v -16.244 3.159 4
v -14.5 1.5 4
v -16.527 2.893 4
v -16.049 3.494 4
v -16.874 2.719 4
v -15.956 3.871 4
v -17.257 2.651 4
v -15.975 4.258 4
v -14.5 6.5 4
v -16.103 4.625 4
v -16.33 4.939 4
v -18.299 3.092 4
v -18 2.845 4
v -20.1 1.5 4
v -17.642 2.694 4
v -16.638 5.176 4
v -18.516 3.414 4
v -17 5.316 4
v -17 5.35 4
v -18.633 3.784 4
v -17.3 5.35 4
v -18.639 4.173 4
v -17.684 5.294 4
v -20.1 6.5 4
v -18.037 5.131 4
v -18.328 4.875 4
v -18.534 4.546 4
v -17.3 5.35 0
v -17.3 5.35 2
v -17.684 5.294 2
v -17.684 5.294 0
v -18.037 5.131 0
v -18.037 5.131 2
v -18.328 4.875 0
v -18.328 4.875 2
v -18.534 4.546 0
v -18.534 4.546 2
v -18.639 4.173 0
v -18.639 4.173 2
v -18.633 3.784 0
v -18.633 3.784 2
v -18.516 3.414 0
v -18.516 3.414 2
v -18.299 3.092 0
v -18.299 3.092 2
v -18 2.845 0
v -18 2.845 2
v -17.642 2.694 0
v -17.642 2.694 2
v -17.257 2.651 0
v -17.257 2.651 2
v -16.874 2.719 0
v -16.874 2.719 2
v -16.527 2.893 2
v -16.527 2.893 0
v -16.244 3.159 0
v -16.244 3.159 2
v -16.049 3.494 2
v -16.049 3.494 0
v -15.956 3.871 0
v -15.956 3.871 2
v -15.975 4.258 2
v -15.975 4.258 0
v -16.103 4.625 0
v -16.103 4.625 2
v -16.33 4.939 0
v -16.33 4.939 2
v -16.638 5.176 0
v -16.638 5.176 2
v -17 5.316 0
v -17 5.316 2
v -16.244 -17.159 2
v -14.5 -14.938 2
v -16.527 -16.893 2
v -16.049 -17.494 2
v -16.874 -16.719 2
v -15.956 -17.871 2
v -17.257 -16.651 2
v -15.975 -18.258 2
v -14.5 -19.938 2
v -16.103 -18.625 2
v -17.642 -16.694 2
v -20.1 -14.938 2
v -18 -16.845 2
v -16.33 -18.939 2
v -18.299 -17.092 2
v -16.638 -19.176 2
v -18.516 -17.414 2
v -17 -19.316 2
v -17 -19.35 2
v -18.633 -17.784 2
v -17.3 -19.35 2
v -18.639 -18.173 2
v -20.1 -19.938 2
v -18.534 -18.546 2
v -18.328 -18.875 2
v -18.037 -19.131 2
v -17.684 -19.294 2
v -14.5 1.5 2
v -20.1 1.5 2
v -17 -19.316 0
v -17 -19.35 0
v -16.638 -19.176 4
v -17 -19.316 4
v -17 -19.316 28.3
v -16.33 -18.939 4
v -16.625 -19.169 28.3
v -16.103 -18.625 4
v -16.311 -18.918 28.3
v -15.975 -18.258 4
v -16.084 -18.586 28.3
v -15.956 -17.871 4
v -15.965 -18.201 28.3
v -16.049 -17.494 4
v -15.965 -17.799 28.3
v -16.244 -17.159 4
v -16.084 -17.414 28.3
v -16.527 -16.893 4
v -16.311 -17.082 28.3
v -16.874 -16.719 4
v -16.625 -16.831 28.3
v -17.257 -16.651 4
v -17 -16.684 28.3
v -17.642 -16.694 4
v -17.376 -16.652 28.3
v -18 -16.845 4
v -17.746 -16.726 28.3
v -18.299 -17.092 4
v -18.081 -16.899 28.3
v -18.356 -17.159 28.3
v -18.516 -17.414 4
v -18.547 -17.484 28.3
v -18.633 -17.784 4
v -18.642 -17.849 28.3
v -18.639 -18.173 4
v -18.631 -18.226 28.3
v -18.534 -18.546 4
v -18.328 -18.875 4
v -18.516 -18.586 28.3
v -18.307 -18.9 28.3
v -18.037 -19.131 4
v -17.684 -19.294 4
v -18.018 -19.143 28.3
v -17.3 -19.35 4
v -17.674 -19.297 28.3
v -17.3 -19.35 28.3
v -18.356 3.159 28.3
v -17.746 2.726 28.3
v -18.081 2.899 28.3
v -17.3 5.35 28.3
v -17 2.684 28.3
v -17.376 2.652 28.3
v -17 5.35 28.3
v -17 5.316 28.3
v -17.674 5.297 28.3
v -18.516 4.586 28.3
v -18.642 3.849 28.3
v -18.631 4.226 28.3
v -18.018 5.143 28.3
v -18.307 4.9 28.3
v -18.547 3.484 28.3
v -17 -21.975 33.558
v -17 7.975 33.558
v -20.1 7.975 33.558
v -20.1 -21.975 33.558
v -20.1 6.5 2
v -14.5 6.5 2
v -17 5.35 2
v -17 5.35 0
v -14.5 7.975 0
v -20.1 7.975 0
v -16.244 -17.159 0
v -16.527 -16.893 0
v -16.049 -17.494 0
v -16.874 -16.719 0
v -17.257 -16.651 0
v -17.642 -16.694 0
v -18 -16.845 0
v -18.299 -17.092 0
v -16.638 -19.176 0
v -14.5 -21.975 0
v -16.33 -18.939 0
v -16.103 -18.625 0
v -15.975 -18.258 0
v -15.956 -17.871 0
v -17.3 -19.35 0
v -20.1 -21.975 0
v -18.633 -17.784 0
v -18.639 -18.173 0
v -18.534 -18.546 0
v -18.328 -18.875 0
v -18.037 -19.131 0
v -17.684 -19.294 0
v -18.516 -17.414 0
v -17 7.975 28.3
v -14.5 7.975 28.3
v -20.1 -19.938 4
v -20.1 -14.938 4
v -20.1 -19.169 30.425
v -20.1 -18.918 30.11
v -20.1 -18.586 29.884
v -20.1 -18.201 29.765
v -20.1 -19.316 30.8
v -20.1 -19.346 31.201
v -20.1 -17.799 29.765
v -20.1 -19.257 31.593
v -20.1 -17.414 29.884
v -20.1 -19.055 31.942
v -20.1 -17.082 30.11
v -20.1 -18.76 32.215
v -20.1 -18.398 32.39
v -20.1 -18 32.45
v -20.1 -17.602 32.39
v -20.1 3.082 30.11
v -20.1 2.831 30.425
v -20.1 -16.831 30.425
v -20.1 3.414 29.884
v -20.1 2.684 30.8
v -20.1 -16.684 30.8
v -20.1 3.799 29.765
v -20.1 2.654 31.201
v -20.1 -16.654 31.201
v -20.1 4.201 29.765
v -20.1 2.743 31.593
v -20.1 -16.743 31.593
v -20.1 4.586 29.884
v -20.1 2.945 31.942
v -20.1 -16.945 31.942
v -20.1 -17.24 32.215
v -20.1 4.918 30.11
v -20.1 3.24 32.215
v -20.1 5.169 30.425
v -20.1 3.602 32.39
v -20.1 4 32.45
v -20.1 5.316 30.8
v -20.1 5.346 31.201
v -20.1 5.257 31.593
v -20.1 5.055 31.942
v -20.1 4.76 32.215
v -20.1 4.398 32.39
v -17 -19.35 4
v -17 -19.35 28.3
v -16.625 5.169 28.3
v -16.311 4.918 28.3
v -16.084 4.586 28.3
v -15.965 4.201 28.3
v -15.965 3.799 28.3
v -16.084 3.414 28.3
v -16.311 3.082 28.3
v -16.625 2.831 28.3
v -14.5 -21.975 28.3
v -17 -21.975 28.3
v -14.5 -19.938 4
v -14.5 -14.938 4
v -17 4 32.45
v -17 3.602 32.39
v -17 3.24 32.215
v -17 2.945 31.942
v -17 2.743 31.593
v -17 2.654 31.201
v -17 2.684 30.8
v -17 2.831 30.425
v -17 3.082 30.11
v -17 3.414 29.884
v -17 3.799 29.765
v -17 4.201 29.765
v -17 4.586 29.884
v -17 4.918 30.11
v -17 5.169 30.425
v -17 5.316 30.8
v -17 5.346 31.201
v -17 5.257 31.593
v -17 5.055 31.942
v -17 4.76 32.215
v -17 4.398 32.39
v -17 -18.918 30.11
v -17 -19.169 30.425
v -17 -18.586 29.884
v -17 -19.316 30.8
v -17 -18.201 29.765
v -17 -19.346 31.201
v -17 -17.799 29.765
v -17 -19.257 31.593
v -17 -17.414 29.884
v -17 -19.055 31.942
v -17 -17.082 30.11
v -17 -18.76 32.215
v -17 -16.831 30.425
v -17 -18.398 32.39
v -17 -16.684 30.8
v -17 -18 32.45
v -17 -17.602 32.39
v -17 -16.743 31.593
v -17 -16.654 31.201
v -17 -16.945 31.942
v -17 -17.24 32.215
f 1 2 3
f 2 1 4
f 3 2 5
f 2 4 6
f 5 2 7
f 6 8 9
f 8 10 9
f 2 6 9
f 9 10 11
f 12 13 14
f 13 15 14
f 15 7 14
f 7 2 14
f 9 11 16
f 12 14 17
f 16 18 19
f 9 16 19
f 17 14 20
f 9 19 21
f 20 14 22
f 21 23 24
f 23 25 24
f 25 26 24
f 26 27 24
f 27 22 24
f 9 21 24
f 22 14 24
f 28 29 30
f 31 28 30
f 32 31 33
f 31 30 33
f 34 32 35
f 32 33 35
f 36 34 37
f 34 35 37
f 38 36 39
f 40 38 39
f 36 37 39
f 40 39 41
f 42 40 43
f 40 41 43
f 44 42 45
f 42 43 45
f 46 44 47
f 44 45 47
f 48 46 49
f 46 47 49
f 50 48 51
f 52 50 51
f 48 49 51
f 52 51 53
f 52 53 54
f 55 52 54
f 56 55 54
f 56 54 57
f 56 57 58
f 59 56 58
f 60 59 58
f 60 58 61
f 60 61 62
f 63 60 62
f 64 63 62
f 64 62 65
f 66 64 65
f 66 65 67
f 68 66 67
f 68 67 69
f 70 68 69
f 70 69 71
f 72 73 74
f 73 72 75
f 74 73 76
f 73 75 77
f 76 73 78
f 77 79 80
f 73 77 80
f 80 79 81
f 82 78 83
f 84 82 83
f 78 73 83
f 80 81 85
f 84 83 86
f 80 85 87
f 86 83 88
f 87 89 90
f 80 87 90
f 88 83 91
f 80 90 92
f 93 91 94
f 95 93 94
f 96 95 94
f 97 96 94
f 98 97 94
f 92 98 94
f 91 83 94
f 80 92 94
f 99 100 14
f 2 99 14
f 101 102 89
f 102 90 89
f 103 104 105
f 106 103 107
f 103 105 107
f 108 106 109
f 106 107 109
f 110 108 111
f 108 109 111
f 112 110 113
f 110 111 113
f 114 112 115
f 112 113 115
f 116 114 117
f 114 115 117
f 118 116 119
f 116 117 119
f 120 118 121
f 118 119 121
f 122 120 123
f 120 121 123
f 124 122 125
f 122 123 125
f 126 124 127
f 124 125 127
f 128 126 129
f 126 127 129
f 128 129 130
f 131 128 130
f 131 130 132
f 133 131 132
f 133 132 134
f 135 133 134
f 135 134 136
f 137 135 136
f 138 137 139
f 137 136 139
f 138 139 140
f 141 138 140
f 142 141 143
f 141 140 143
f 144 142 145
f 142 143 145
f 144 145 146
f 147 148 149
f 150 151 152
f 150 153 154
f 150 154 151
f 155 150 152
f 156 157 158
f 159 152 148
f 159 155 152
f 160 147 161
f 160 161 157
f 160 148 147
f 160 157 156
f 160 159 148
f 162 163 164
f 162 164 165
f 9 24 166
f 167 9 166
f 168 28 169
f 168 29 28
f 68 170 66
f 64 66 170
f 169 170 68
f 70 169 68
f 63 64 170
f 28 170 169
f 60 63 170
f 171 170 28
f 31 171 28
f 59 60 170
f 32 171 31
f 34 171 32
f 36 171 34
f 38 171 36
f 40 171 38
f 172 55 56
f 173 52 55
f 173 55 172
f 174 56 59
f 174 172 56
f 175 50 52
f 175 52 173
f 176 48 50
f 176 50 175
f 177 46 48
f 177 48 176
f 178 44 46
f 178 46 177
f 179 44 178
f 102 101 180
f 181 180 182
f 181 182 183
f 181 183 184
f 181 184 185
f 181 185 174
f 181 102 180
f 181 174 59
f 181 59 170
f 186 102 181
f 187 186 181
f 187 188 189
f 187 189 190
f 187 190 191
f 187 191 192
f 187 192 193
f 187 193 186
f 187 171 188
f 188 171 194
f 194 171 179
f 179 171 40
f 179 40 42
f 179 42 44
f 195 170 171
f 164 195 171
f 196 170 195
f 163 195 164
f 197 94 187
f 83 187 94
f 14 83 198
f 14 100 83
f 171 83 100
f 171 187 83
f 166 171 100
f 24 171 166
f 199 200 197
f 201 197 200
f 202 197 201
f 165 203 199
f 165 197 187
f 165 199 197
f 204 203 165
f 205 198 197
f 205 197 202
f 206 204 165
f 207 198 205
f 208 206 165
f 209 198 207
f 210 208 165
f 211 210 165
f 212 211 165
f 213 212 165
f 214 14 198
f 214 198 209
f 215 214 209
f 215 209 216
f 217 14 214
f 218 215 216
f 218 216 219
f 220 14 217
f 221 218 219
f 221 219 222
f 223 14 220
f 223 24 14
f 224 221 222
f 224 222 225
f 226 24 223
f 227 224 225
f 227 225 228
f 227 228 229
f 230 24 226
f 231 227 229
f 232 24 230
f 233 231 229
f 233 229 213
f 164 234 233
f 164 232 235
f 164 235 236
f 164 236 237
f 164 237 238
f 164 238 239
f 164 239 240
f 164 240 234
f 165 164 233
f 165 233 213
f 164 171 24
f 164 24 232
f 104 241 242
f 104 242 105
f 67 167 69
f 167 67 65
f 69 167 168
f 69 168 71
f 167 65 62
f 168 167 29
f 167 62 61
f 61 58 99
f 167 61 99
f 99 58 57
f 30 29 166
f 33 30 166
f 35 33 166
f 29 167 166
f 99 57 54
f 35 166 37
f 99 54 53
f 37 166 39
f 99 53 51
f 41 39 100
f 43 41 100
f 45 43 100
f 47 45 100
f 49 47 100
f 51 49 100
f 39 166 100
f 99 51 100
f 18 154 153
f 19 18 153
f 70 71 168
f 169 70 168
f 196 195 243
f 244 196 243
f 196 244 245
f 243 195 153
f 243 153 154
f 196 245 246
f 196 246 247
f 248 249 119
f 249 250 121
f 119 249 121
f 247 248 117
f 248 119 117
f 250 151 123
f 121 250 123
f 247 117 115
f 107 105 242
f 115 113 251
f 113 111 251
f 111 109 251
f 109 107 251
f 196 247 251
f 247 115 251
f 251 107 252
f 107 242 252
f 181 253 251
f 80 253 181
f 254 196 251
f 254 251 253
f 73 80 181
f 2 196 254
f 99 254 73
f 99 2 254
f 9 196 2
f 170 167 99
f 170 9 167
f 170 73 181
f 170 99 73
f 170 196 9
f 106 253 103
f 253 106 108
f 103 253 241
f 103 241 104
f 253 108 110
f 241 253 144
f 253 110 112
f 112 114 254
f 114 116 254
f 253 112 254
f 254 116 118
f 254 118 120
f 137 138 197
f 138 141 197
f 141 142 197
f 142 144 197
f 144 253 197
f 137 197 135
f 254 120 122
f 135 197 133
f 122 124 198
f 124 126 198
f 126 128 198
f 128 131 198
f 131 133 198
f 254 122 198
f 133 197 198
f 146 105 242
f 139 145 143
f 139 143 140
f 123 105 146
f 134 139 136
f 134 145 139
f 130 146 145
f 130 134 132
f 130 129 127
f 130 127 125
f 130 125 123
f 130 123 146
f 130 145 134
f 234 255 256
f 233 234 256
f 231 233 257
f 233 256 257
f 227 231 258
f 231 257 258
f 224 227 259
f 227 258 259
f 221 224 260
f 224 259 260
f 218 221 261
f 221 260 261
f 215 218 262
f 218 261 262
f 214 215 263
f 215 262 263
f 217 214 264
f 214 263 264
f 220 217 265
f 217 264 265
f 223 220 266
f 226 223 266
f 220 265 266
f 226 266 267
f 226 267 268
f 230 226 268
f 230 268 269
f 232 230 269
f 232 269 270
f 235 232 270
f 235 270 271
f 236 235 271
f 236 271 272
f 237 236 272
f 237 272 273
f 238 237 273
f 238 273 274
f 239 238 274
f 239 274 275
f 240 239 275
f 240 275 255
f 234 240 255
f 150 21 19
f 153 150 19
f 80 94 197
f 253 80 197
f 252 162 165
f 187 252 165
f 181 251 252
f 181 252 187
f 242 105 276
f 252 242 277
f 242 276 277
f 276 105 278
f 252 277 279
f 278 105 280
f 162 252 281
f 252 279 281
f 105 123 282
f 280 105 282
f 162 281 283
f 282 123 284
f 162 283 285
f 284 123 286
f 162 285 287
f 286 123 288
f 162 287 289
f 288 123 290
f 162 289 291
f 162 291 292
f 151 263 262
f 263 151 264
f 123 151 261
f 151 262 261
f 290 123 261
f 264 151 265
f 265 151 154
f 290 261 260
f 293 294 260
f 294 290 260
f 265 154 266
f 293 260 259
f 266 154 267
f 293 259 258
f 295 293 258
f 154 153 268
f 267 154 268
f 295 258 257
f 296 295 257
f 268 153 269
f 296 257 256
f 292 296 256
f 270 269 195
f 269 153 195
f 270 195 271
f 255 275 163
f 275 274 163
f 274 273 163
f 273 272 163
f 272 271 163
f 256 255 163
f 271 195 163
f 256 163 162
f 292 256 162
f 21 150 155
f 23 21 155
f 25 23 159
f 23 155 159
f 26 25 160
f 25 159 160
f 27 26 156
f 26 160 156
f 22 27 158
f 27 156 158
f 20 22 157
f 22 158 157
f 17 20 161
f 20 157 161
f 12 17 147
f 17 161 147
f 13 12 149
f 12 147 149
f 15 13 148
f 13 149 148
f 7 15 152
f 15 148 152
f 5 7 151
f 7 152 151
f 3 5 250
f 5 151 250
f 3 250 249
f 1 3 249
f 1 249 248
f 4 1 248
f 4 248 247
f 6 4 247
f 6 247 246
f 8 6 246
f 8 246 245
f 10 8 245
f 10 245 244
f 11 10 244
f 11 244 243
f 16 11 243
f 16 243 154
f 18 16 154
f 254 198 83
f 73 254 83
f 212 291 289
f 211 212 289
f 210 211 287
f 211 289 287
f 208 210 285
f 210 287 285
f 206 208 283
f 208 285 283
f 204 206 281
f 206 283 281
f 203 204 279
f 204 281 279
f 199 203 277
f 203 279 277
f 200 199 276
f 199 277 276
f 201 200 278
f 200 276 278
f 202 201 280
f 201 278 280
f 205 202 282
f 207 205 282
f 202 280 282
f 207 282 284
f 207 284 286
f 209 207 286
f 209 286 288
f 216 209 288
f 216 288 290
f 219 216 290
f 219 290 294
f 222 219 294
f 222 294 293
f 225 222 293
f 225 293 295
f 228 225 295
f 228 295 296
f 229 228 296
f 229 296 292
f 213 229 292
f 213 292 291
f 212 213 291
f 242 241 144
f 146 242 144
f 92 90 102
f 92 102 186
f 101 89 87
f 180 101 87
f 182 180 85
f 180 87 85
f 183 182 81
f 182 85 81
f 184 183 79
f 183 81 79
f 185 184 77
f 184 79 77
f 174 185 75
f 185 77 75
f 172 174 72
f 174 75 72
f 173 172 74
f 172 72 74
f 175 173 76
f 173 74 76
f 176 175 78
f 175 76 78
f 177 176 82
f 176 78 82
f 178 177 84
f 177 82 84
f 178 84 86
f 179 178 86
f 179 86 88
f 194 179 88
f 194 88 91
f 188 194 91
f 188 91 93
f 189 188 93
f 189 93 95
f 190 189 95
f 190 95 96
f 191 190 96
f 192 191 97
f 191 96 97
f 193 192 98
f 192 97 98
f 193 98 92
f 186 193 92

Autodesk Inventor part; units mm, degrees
ref_plane "YZ Plane" through (0, 0, 0) normal (1, 0, 0) x (0, 1, 0)
ref_plane "XZ Plane" through (0, 0, 0) normal (0, 1, 0) x (-1, 0, 0)
ref_plane "XY Plane" through (0, 0, 0) normal (0, 0, 1) x (1, 0, 0)
ref_plane "작업 평면1" through (0, 0, 0) normal (0, 0, 1) x (1, 0, 0)
ref_plane "작업 평면2" through (-17, 0, 48.4) normal (-1, 0, 0) x (0, 0, 1)
sketch "스케치2" plane through (-17, 0, 48.4) normal (-1, 0, 0) x (0, 0, 1)
  line L0 (13.5, -39.75) -> (11.5, -39.75) projected
  arc A0 (11.5, -39.75) -> (9.25, -42) centre (11.5, -42) ccw projected
  line L1 (9.25, -42) -> (9.25, -44) projected
  arc A1 (8.25, -45) -> (9.25, -44) centre (8.25, -44) ccw projected
  line L2 (8.25, -45) -> (-8.25, -45) projected
  arc A2 (-9.25, -44) -> (-8.25, -45) centre (-8.25, -44) ccw projected
  line L3 (-9.25, -44) -> (-9.25, -42) projected
  arc A3 (-9.25, -42) -> (-11.5, -39.75) centre (-11.5, -42) ccw projected
  line L4 (-11.5, -39.75) -> (-13.5, -39.75) projected
  arc A4 (-14.5, -38.75) -> (-13.5, -39.75) centre (-13.5, -38.75) ccw projected
  line L5 (-14.5, -38.75) -> (-14.5, 8.25) projected
  arc A5 (-13.5, 9.25) -> (-14.5, 8.25) centre (-13.5, 8.25) ccw projected
  line L6 (-13.5, 9.25) -> (-11.5, 9.25) projected
  arc A6 (-11.5, 9.25) -> (-9.25, 11.5) centre (-11.5, 11.5) ccw projected
  line L7 (-9.25, 11.5) -> (-9.25, 14.5) projected
  line L8 (-15, 14.5) -> (-9.25, 14.5) projected
  line L9 (-20.1, 8.5) -> (-15, 14.5) projected
  line L10 (-20.1, -44.6) -> (-20.1, 8.5) projected
  line L11 (-15, -50.6) -> (-20.1, -44.6) projected
  line L12 (15, -50.6) -> (-15, -50.6) projected
  line L13 (20.1, -44.6) -> (15, -50.6) projected
  line L14 (20.1, 8.5) -> (20.1, -44.6) projected
  line L15 (15, 14.5) -> (20.1, 8.5) projected
  line L16 (9.25, 14.5) -> (15, 14.5) projected
  line L17 (9.25, 14.5) -> (9.25, 11.5) projected
  arc A7 (9.25, 11.5) -> (11.5, 9.25) centre (11.5, 11.5) ccw projected
  line L18 (11.5, 9.25) -> (13.5, 9.25) projected
  arc A8 (14.5, 8.25) -> (13.5, 9.25) centre (13.5, 8.25) ccw projected
  line L19 (14.5, 8.25) -> (14.5, -38.75) projected
  arc A9 (13.5, -39.75) -> (14.5, -38.75) centre (13.5, -38.75) ccw projected
  circle A10 centre (17.3, 4) radius 1.35 projected
  circle A11 centre (17.3, -18) radius 1.35 projected
  circle A12 centre (11, -47.8) radius 1.35 projected
  circle A13 centre (-17.3, 4) radius 1.35 projected
  circle A14 centre (-17.3, -18) radius 1.35 projected
  circle A15 centre (-11, -47.8) radius 1.35 projected
  circle A16 centre (17.3, -40) radius 1.35 projected
  circle A17 centre (-17.3, -40) radius 1.35 projected
  circle A18 centre (-17.3, -18) radius 2.8
  circle A19 centre (-17.3, 4) radius 2.8
  line L20 (-17.3, -18) -> (-17.3, 4)
  line L21 (-17.3, 4) -> (-17.3, -7)
  line L22 (-19.7531, 5.35) -> (-19.7531, -19.35)
  line L23 (-19.7531, -19.35) -> (-14.8469, -19.35)
  line L24 (-14.8469, -19.35) -> (-14.8469, 5.35)
  line L25 (-14.8469, 5.35) -> (-19.7531, 5.35)
  line L26 (-19.7531, 5.35) -> (-14.8469, -19.35) construction
  line L27 (-19.7531, -19.35) -> (-14.8469, 5.35) construction
  point P0 (-48.4, 0)
  point P1 (-19.7531, -19.35)
  point P2 (-14.8469, -19.35)
  point P3 (-14.8469, 5.35)
  point P4 (-19.7531, 5.35)
  dimension "d0" = 11
extrude "돌출1" add sketch "스케치2" along normal blind 3.1 contours A18 L23 | L23 A14 L20 A18 L24 | A18 L20 A19 L24 | L25 A19 | L24 A19 L20 A13 L25 | L22 A18 L20 A14 L23 | A18 L22 A19 L20 | L25 A13 L20 A19 L22
sketch "스케치3" plane through (-17, -19.35, 28.6469) normal (0, 0, -1) x (-1, 0, 0)
  line L0 (3.1, 24.7) -> (3.1, 0) projected
  line L1 (0, 0) -> (3.1, 0) projected
  line L2 (0, 24.7) -> (0, 0) projected
  line L3 (0, 0) -> (3.1, 0) projected
  line L4 (3.1, 24.7) -> (3.1, 0) projected
  line L5 (0, 24.7) -> (3.1, 24.7) projected
  point P0 (-17, 19.35)
extrude "돌출2" add sketch "스케치3" along normal blind 0.347
sketch "스케치4" plane through (-17, -19.35, 28.2999) normal (0, 0, -1) x (-1, 0, 0)
  line L0 (-4.5, 27.325) -> (-4.5, 25.825) projected
  line L1 (-4.5, 25.825) -> (-2.5, 25.825) projected
  line L2 (-2.5, 20.875) -> (-2.5, 25.825) projected
  line L3 (-4.5, 20.875) -> (-2.5, 20.875) projected
  line L4 (-4.5, 20.875) -> (-4.5, 19.375) projected
  line L5 (-4.5, 19.375) -> (-2, 19.375) projected
  line L6 (-2, 5.325) -> (-2, 19.375) projected
  line L7 (-2, 5.325) -> (-4.5, 5.325) projected
  line L8 (-4.5, 5.325) -> (-4.5, 3.825) projected
  line L9 (-4.5, 3.825) -> (-2.5, 3.825) projected
  line L10 (-2.5, -1.125) -> (-2.5, 3.825) projected
  line L11 (-4.5, -1.125) -> (-2.5, -1.125) projected
  line L12 (-4.5, -1.125) -> (-4.5, -2.625) projected
  line L13 (-4.5, -2.625) -> (-2, -2.625) projected
  line L14 (-2, -16.675) -> (-2, -2.625) projected
  line L15 (-2, -16.675) -> (-4.5, -16.675) projected
  line L16 (-4.5, -16.675) -> (-4.5, -18.175) projected
  line L17 (-4.5, -18.175) -> (-2.5, -18.175) projected
  line L18 (-2.5, -23.125) -> (-2.5, -18.175) projected
  line L19 (-4.5, -23.125) -> (-2.5, -23.125) projected
  line L20 (-4.5, -23.125) -> (-4.5, -24.625) projected
  line L21 (-4.5, -24.625) -> (-2, -24.625) projected
  line L22 (-2, -25.25) -> (-2, -24.625) projected
  line L23 (-2, -25.25) -> (0, -25.25) projected
  line L24 (0, -25.25) -> (0, 27.85) projected
  line L25 (-2, 27.85) -> (0, 27.85) projected
  line L26 (-2, 27.325) -> (-2, 27.85) projected
  line L27 (-2, 27.325) -> (-4.5, 27.325) projected
  line L28 (0, 0) -> (3.1, 0) projected
  line L29 (-2.5, 0) -> (0, 0)
  line L30 (3.1, 24.7) -> (0, 24.7) projected
  line L31 (-2.5, 24.7) -> (0, 24.7)
  line L32 (3.1, -2.625) -> (-2.5, -2.625) projected
  line L33 (-2.5, 27.325) -> (1.417, 27.325) projected
  line L34 (3.1, 24.7) -> (-2.5, 24.7)
  line L35 (-2.5, 24.7) -> (-2.5, 27.325)
  line L36 (-2.5, 27.325) -> (3.1, 27.325)
  line L37 (3.1, 27.325) -> (3.1, 24.7)
  line L38 (-2.5, 0) -> (3.1, 0)
  line L39 (3.1, 0) -> (3.1, -2.625)
  line L40 (3.1, -2.625) -> (-2.5, -2.625)
  line L41 (-2.5, -2.625) -> (-2.5, 0)
  line L42 (3.1, 23.9266) -> (3.1, -20.3266) projected
  line L43 (3.1, 0) -> (3.1, 24.7) projected
  circle A0 centre (0.3, 1.35) radius 1.35 projected
  circle A1 centre (0.3, 23.35) radius 1.35 projected
  point P0 (-17, 19.35)
  point P1 (1.417, 27.325)
  point P2 (-2.5, 25.825)
  point P3 (-2.5, -1.125)
  point P4 (-2.5, -2.625)
  point P5 (0.3, 24.7)
  point P6 (0, 24.6662)
  point P7 (0, 0.0338)
  point P8 (0.3, 0)
extrude "돌출3" add sketch "스케치4" along normal blind 28.3 contours L27 L33 L24 L31 L2 L35 | L31 L24 A1 A0 L29 L10 L9 L8 L7 L6 L5 L4 L3 L2 | L33 L36 L37 L30 L24 | L30 L43 L42 L28 A0 L24 A1 | L39 L32 L24 L28 | L24 L32 L13 L41 L10 L29
sketch "스케치6" plane through (-17, -19.35, -0.0001) normal (0, 0, -1) x (-1, 0, 0)
  point P0 (-17, 19.35)
sketch "스케치7" plane through (-20.1, 0, 48.4) normal (-1, 0, 0) x (0, 0, 1)
  line L0 (-20.1001, -15.525) -> (-48.4001, -15.525) projected
  line L1 (-20.1001, -19.35) -> (-48.4001, -19.35) projected
  line L2 (-48.4001, 2.65) -> (-20.1001, 2.65) projected
  line L3 (-20.1001, 5.35) -> (-48.4001, 5.35) projected
  line L4 (-48.4001, -19.35) -> (-45.4001, -19.35)
  line L5 (-45.4001, -19.35) -> (-45.4001, 5.35)
  line L6 (-43.3972, -19.35) -> (-43.3972, -17.4375)
  line L7 (-43.3972, -17.4375) -> (-45.4001, -17.4375)
  line L8 (-46.4001, -14.9375) -> (-46.4001, -19.9375)
  line L9 (-46.4001, -19.9375) -> (-44.4001, -19.9375)
  line L10 (-44.4001, -19.9375) -> (-44.4001, -14.9375)
  line L11 (-44.4001, -14.9375) -> (-46.4001, -14.9375)
  line L12 (-46.4001, -14.9375) -> (-44.4001, -19.9375) construction
  line L13 (-46.4001, -19.9375) -> (-44.4001, -14.9375) construction
  line L14 (-45.4001, 2.65) -> (-45.4001, 4)
  line L15 (-46.4001, 6.5) -> (-46.4001, 1.5)
  line L16 (-46.4001, 1.5) -> (-44.4001, 1.5)
  line L17 (-44.4001, 1.5) -> (-44.4001, 6.5)
  line L18 (-44.4001, 6.5) -> (-46.4001, 6.5)
  line L19 (-46.4001, 6.5) -> (-44.4001, 1.5) construction
  line L20 (-46.4001, 1.5) -> (-44.4001, 6.5) construction
  point P0 (-48.4, 0)
  dimension "d7" = 3
  dimension "d8" = 1.9125
  dimension "d9" = 2
  dimension "d10" = 1.35
  dimension "d11" = 5
  dimension "d12" = 5
  dimension "d13" = 2
extrude "돌출4" cut sketch "스케치7" against normal blind 6 contours L10 L7 L5 L0 | L16 L15 L2 L5 | L5 L2 L17 L16 | L0 L5 L11 L10 | L5 L1 L8 L0 | L0 L8 L11 L5 | L10 L1 L5 L7 | L10 L9 L8 L1 | L5 L3 L17 L2 | L2 L15 L3 L5 | L15 L18 L17 L3
sketch "스케치8" plane through (-17, 0, 48.4) normal (-1, 0, 0) x (0, 0, 1)
  line L0 (-20.1001, -21.975) -> (-20.1001, -19.35) projected
  line L1 (-20.1001, -21.975) -> (-20.1001, 7.975)
  line L2 (-20.1001, 7.975) -> (-14.8422, 7.975)
  line L3 (-14.8422, 7.975) -> (-14.8422, -21.975)
  line L4 (-14.8422, -21.975) -> (-20.1001, -21.975)
  arc A0 (-19.7531, -19.35) -> (-14.8469, -19.35) centre (-17.3, -18) ccw projected
  line L5 (-19.7531, -19.35) -> (-20.1001, -19.35) projected
  line L6 (-20.1001, -19.3162) -> (-20.1001, -19.35) projected
  line L7 (-20.1001, -16.6838) -> (-20.1001, -19.3162) projected
  line L8 (-20.1001, 2.6838) -> (-20.1001, -16.6838) projected
  line L9 (-20.1001, 5.3162) -> (-20.1001, 2.6838) projected
  line L10 (-20.1001, 5.35) -> (-20.1001, 5.3162) projected
  line L11 (-19.7531, 5.35) -> (-20.1001, 5.35) projected
  arc A1 (-14.8469, 5.35) -> (-19.7531, 5.35) centre (-17.3, 4) ccw projected
  line L12 (-14.8469, -19.35) -> (-14.8469, 5.35) projected
  circle A2 centre (-17.3, 4) radius 1.35 projected
  circle A3 centre (-17.3, -18) radius 1.35 projected
  point P0 (-48.4, 0)
  point P1 (-20.1001, 5.35)
  point P2 (-20.1001, -19.35)
extrude "돌출5" add sketch "스케치8" along normal blind 3.1 contours L0 L5 A0 L12 A1 L11 L1 L2 L3 L4
sketch "스케치9" plane through (-12.5, 0.025, 28.2999) normal (1, 0, 0) x (0, 0, -1)
  line L0 (0, 1.5) -> (0, 0) projected
  line L1 (0, 0) -> (28.3, 0) projected
  line L2 (28.3, 1.5) -> (28.3, 0) projected
  line L3 (0, 1.5) -> (28.3, 1.5) projected
  line L4 (0, -14.05) -> (0, -15.55) projected
  line L5 (0, -15.55) -> (28.3, -15.55) projected
  line L6 (28.3, -14.05) -> (28.3, -15.55) projected
  line L7 (0, -14.05) -> (28.3, -14.05) projected
  point P0 (28.2999, -0.025)
extrude "돌출6" cut sketch "스케치9" against normal up to surface (2 mm away)
sketch "스케치10" plane through (-15, -14.025, 28.2999) normal (1, 0, 0) x (0, 0, -1)
  line L0 (0, 14.05) -> (0, 0) projected
  line L1 (0, 0) -> (28.3, 0) projected
  line L2 (28.3, 14.05) -> (28.3, 0) projected
  line L3 (0, 14.05) -> (28.3, 14.05) projected
  point P0 (28.2999, 14.025)
extrude "돌출7" add sketch "스케치10" along normal up to surface (0.5 mm away)
properties part number "_108-64_adt"
